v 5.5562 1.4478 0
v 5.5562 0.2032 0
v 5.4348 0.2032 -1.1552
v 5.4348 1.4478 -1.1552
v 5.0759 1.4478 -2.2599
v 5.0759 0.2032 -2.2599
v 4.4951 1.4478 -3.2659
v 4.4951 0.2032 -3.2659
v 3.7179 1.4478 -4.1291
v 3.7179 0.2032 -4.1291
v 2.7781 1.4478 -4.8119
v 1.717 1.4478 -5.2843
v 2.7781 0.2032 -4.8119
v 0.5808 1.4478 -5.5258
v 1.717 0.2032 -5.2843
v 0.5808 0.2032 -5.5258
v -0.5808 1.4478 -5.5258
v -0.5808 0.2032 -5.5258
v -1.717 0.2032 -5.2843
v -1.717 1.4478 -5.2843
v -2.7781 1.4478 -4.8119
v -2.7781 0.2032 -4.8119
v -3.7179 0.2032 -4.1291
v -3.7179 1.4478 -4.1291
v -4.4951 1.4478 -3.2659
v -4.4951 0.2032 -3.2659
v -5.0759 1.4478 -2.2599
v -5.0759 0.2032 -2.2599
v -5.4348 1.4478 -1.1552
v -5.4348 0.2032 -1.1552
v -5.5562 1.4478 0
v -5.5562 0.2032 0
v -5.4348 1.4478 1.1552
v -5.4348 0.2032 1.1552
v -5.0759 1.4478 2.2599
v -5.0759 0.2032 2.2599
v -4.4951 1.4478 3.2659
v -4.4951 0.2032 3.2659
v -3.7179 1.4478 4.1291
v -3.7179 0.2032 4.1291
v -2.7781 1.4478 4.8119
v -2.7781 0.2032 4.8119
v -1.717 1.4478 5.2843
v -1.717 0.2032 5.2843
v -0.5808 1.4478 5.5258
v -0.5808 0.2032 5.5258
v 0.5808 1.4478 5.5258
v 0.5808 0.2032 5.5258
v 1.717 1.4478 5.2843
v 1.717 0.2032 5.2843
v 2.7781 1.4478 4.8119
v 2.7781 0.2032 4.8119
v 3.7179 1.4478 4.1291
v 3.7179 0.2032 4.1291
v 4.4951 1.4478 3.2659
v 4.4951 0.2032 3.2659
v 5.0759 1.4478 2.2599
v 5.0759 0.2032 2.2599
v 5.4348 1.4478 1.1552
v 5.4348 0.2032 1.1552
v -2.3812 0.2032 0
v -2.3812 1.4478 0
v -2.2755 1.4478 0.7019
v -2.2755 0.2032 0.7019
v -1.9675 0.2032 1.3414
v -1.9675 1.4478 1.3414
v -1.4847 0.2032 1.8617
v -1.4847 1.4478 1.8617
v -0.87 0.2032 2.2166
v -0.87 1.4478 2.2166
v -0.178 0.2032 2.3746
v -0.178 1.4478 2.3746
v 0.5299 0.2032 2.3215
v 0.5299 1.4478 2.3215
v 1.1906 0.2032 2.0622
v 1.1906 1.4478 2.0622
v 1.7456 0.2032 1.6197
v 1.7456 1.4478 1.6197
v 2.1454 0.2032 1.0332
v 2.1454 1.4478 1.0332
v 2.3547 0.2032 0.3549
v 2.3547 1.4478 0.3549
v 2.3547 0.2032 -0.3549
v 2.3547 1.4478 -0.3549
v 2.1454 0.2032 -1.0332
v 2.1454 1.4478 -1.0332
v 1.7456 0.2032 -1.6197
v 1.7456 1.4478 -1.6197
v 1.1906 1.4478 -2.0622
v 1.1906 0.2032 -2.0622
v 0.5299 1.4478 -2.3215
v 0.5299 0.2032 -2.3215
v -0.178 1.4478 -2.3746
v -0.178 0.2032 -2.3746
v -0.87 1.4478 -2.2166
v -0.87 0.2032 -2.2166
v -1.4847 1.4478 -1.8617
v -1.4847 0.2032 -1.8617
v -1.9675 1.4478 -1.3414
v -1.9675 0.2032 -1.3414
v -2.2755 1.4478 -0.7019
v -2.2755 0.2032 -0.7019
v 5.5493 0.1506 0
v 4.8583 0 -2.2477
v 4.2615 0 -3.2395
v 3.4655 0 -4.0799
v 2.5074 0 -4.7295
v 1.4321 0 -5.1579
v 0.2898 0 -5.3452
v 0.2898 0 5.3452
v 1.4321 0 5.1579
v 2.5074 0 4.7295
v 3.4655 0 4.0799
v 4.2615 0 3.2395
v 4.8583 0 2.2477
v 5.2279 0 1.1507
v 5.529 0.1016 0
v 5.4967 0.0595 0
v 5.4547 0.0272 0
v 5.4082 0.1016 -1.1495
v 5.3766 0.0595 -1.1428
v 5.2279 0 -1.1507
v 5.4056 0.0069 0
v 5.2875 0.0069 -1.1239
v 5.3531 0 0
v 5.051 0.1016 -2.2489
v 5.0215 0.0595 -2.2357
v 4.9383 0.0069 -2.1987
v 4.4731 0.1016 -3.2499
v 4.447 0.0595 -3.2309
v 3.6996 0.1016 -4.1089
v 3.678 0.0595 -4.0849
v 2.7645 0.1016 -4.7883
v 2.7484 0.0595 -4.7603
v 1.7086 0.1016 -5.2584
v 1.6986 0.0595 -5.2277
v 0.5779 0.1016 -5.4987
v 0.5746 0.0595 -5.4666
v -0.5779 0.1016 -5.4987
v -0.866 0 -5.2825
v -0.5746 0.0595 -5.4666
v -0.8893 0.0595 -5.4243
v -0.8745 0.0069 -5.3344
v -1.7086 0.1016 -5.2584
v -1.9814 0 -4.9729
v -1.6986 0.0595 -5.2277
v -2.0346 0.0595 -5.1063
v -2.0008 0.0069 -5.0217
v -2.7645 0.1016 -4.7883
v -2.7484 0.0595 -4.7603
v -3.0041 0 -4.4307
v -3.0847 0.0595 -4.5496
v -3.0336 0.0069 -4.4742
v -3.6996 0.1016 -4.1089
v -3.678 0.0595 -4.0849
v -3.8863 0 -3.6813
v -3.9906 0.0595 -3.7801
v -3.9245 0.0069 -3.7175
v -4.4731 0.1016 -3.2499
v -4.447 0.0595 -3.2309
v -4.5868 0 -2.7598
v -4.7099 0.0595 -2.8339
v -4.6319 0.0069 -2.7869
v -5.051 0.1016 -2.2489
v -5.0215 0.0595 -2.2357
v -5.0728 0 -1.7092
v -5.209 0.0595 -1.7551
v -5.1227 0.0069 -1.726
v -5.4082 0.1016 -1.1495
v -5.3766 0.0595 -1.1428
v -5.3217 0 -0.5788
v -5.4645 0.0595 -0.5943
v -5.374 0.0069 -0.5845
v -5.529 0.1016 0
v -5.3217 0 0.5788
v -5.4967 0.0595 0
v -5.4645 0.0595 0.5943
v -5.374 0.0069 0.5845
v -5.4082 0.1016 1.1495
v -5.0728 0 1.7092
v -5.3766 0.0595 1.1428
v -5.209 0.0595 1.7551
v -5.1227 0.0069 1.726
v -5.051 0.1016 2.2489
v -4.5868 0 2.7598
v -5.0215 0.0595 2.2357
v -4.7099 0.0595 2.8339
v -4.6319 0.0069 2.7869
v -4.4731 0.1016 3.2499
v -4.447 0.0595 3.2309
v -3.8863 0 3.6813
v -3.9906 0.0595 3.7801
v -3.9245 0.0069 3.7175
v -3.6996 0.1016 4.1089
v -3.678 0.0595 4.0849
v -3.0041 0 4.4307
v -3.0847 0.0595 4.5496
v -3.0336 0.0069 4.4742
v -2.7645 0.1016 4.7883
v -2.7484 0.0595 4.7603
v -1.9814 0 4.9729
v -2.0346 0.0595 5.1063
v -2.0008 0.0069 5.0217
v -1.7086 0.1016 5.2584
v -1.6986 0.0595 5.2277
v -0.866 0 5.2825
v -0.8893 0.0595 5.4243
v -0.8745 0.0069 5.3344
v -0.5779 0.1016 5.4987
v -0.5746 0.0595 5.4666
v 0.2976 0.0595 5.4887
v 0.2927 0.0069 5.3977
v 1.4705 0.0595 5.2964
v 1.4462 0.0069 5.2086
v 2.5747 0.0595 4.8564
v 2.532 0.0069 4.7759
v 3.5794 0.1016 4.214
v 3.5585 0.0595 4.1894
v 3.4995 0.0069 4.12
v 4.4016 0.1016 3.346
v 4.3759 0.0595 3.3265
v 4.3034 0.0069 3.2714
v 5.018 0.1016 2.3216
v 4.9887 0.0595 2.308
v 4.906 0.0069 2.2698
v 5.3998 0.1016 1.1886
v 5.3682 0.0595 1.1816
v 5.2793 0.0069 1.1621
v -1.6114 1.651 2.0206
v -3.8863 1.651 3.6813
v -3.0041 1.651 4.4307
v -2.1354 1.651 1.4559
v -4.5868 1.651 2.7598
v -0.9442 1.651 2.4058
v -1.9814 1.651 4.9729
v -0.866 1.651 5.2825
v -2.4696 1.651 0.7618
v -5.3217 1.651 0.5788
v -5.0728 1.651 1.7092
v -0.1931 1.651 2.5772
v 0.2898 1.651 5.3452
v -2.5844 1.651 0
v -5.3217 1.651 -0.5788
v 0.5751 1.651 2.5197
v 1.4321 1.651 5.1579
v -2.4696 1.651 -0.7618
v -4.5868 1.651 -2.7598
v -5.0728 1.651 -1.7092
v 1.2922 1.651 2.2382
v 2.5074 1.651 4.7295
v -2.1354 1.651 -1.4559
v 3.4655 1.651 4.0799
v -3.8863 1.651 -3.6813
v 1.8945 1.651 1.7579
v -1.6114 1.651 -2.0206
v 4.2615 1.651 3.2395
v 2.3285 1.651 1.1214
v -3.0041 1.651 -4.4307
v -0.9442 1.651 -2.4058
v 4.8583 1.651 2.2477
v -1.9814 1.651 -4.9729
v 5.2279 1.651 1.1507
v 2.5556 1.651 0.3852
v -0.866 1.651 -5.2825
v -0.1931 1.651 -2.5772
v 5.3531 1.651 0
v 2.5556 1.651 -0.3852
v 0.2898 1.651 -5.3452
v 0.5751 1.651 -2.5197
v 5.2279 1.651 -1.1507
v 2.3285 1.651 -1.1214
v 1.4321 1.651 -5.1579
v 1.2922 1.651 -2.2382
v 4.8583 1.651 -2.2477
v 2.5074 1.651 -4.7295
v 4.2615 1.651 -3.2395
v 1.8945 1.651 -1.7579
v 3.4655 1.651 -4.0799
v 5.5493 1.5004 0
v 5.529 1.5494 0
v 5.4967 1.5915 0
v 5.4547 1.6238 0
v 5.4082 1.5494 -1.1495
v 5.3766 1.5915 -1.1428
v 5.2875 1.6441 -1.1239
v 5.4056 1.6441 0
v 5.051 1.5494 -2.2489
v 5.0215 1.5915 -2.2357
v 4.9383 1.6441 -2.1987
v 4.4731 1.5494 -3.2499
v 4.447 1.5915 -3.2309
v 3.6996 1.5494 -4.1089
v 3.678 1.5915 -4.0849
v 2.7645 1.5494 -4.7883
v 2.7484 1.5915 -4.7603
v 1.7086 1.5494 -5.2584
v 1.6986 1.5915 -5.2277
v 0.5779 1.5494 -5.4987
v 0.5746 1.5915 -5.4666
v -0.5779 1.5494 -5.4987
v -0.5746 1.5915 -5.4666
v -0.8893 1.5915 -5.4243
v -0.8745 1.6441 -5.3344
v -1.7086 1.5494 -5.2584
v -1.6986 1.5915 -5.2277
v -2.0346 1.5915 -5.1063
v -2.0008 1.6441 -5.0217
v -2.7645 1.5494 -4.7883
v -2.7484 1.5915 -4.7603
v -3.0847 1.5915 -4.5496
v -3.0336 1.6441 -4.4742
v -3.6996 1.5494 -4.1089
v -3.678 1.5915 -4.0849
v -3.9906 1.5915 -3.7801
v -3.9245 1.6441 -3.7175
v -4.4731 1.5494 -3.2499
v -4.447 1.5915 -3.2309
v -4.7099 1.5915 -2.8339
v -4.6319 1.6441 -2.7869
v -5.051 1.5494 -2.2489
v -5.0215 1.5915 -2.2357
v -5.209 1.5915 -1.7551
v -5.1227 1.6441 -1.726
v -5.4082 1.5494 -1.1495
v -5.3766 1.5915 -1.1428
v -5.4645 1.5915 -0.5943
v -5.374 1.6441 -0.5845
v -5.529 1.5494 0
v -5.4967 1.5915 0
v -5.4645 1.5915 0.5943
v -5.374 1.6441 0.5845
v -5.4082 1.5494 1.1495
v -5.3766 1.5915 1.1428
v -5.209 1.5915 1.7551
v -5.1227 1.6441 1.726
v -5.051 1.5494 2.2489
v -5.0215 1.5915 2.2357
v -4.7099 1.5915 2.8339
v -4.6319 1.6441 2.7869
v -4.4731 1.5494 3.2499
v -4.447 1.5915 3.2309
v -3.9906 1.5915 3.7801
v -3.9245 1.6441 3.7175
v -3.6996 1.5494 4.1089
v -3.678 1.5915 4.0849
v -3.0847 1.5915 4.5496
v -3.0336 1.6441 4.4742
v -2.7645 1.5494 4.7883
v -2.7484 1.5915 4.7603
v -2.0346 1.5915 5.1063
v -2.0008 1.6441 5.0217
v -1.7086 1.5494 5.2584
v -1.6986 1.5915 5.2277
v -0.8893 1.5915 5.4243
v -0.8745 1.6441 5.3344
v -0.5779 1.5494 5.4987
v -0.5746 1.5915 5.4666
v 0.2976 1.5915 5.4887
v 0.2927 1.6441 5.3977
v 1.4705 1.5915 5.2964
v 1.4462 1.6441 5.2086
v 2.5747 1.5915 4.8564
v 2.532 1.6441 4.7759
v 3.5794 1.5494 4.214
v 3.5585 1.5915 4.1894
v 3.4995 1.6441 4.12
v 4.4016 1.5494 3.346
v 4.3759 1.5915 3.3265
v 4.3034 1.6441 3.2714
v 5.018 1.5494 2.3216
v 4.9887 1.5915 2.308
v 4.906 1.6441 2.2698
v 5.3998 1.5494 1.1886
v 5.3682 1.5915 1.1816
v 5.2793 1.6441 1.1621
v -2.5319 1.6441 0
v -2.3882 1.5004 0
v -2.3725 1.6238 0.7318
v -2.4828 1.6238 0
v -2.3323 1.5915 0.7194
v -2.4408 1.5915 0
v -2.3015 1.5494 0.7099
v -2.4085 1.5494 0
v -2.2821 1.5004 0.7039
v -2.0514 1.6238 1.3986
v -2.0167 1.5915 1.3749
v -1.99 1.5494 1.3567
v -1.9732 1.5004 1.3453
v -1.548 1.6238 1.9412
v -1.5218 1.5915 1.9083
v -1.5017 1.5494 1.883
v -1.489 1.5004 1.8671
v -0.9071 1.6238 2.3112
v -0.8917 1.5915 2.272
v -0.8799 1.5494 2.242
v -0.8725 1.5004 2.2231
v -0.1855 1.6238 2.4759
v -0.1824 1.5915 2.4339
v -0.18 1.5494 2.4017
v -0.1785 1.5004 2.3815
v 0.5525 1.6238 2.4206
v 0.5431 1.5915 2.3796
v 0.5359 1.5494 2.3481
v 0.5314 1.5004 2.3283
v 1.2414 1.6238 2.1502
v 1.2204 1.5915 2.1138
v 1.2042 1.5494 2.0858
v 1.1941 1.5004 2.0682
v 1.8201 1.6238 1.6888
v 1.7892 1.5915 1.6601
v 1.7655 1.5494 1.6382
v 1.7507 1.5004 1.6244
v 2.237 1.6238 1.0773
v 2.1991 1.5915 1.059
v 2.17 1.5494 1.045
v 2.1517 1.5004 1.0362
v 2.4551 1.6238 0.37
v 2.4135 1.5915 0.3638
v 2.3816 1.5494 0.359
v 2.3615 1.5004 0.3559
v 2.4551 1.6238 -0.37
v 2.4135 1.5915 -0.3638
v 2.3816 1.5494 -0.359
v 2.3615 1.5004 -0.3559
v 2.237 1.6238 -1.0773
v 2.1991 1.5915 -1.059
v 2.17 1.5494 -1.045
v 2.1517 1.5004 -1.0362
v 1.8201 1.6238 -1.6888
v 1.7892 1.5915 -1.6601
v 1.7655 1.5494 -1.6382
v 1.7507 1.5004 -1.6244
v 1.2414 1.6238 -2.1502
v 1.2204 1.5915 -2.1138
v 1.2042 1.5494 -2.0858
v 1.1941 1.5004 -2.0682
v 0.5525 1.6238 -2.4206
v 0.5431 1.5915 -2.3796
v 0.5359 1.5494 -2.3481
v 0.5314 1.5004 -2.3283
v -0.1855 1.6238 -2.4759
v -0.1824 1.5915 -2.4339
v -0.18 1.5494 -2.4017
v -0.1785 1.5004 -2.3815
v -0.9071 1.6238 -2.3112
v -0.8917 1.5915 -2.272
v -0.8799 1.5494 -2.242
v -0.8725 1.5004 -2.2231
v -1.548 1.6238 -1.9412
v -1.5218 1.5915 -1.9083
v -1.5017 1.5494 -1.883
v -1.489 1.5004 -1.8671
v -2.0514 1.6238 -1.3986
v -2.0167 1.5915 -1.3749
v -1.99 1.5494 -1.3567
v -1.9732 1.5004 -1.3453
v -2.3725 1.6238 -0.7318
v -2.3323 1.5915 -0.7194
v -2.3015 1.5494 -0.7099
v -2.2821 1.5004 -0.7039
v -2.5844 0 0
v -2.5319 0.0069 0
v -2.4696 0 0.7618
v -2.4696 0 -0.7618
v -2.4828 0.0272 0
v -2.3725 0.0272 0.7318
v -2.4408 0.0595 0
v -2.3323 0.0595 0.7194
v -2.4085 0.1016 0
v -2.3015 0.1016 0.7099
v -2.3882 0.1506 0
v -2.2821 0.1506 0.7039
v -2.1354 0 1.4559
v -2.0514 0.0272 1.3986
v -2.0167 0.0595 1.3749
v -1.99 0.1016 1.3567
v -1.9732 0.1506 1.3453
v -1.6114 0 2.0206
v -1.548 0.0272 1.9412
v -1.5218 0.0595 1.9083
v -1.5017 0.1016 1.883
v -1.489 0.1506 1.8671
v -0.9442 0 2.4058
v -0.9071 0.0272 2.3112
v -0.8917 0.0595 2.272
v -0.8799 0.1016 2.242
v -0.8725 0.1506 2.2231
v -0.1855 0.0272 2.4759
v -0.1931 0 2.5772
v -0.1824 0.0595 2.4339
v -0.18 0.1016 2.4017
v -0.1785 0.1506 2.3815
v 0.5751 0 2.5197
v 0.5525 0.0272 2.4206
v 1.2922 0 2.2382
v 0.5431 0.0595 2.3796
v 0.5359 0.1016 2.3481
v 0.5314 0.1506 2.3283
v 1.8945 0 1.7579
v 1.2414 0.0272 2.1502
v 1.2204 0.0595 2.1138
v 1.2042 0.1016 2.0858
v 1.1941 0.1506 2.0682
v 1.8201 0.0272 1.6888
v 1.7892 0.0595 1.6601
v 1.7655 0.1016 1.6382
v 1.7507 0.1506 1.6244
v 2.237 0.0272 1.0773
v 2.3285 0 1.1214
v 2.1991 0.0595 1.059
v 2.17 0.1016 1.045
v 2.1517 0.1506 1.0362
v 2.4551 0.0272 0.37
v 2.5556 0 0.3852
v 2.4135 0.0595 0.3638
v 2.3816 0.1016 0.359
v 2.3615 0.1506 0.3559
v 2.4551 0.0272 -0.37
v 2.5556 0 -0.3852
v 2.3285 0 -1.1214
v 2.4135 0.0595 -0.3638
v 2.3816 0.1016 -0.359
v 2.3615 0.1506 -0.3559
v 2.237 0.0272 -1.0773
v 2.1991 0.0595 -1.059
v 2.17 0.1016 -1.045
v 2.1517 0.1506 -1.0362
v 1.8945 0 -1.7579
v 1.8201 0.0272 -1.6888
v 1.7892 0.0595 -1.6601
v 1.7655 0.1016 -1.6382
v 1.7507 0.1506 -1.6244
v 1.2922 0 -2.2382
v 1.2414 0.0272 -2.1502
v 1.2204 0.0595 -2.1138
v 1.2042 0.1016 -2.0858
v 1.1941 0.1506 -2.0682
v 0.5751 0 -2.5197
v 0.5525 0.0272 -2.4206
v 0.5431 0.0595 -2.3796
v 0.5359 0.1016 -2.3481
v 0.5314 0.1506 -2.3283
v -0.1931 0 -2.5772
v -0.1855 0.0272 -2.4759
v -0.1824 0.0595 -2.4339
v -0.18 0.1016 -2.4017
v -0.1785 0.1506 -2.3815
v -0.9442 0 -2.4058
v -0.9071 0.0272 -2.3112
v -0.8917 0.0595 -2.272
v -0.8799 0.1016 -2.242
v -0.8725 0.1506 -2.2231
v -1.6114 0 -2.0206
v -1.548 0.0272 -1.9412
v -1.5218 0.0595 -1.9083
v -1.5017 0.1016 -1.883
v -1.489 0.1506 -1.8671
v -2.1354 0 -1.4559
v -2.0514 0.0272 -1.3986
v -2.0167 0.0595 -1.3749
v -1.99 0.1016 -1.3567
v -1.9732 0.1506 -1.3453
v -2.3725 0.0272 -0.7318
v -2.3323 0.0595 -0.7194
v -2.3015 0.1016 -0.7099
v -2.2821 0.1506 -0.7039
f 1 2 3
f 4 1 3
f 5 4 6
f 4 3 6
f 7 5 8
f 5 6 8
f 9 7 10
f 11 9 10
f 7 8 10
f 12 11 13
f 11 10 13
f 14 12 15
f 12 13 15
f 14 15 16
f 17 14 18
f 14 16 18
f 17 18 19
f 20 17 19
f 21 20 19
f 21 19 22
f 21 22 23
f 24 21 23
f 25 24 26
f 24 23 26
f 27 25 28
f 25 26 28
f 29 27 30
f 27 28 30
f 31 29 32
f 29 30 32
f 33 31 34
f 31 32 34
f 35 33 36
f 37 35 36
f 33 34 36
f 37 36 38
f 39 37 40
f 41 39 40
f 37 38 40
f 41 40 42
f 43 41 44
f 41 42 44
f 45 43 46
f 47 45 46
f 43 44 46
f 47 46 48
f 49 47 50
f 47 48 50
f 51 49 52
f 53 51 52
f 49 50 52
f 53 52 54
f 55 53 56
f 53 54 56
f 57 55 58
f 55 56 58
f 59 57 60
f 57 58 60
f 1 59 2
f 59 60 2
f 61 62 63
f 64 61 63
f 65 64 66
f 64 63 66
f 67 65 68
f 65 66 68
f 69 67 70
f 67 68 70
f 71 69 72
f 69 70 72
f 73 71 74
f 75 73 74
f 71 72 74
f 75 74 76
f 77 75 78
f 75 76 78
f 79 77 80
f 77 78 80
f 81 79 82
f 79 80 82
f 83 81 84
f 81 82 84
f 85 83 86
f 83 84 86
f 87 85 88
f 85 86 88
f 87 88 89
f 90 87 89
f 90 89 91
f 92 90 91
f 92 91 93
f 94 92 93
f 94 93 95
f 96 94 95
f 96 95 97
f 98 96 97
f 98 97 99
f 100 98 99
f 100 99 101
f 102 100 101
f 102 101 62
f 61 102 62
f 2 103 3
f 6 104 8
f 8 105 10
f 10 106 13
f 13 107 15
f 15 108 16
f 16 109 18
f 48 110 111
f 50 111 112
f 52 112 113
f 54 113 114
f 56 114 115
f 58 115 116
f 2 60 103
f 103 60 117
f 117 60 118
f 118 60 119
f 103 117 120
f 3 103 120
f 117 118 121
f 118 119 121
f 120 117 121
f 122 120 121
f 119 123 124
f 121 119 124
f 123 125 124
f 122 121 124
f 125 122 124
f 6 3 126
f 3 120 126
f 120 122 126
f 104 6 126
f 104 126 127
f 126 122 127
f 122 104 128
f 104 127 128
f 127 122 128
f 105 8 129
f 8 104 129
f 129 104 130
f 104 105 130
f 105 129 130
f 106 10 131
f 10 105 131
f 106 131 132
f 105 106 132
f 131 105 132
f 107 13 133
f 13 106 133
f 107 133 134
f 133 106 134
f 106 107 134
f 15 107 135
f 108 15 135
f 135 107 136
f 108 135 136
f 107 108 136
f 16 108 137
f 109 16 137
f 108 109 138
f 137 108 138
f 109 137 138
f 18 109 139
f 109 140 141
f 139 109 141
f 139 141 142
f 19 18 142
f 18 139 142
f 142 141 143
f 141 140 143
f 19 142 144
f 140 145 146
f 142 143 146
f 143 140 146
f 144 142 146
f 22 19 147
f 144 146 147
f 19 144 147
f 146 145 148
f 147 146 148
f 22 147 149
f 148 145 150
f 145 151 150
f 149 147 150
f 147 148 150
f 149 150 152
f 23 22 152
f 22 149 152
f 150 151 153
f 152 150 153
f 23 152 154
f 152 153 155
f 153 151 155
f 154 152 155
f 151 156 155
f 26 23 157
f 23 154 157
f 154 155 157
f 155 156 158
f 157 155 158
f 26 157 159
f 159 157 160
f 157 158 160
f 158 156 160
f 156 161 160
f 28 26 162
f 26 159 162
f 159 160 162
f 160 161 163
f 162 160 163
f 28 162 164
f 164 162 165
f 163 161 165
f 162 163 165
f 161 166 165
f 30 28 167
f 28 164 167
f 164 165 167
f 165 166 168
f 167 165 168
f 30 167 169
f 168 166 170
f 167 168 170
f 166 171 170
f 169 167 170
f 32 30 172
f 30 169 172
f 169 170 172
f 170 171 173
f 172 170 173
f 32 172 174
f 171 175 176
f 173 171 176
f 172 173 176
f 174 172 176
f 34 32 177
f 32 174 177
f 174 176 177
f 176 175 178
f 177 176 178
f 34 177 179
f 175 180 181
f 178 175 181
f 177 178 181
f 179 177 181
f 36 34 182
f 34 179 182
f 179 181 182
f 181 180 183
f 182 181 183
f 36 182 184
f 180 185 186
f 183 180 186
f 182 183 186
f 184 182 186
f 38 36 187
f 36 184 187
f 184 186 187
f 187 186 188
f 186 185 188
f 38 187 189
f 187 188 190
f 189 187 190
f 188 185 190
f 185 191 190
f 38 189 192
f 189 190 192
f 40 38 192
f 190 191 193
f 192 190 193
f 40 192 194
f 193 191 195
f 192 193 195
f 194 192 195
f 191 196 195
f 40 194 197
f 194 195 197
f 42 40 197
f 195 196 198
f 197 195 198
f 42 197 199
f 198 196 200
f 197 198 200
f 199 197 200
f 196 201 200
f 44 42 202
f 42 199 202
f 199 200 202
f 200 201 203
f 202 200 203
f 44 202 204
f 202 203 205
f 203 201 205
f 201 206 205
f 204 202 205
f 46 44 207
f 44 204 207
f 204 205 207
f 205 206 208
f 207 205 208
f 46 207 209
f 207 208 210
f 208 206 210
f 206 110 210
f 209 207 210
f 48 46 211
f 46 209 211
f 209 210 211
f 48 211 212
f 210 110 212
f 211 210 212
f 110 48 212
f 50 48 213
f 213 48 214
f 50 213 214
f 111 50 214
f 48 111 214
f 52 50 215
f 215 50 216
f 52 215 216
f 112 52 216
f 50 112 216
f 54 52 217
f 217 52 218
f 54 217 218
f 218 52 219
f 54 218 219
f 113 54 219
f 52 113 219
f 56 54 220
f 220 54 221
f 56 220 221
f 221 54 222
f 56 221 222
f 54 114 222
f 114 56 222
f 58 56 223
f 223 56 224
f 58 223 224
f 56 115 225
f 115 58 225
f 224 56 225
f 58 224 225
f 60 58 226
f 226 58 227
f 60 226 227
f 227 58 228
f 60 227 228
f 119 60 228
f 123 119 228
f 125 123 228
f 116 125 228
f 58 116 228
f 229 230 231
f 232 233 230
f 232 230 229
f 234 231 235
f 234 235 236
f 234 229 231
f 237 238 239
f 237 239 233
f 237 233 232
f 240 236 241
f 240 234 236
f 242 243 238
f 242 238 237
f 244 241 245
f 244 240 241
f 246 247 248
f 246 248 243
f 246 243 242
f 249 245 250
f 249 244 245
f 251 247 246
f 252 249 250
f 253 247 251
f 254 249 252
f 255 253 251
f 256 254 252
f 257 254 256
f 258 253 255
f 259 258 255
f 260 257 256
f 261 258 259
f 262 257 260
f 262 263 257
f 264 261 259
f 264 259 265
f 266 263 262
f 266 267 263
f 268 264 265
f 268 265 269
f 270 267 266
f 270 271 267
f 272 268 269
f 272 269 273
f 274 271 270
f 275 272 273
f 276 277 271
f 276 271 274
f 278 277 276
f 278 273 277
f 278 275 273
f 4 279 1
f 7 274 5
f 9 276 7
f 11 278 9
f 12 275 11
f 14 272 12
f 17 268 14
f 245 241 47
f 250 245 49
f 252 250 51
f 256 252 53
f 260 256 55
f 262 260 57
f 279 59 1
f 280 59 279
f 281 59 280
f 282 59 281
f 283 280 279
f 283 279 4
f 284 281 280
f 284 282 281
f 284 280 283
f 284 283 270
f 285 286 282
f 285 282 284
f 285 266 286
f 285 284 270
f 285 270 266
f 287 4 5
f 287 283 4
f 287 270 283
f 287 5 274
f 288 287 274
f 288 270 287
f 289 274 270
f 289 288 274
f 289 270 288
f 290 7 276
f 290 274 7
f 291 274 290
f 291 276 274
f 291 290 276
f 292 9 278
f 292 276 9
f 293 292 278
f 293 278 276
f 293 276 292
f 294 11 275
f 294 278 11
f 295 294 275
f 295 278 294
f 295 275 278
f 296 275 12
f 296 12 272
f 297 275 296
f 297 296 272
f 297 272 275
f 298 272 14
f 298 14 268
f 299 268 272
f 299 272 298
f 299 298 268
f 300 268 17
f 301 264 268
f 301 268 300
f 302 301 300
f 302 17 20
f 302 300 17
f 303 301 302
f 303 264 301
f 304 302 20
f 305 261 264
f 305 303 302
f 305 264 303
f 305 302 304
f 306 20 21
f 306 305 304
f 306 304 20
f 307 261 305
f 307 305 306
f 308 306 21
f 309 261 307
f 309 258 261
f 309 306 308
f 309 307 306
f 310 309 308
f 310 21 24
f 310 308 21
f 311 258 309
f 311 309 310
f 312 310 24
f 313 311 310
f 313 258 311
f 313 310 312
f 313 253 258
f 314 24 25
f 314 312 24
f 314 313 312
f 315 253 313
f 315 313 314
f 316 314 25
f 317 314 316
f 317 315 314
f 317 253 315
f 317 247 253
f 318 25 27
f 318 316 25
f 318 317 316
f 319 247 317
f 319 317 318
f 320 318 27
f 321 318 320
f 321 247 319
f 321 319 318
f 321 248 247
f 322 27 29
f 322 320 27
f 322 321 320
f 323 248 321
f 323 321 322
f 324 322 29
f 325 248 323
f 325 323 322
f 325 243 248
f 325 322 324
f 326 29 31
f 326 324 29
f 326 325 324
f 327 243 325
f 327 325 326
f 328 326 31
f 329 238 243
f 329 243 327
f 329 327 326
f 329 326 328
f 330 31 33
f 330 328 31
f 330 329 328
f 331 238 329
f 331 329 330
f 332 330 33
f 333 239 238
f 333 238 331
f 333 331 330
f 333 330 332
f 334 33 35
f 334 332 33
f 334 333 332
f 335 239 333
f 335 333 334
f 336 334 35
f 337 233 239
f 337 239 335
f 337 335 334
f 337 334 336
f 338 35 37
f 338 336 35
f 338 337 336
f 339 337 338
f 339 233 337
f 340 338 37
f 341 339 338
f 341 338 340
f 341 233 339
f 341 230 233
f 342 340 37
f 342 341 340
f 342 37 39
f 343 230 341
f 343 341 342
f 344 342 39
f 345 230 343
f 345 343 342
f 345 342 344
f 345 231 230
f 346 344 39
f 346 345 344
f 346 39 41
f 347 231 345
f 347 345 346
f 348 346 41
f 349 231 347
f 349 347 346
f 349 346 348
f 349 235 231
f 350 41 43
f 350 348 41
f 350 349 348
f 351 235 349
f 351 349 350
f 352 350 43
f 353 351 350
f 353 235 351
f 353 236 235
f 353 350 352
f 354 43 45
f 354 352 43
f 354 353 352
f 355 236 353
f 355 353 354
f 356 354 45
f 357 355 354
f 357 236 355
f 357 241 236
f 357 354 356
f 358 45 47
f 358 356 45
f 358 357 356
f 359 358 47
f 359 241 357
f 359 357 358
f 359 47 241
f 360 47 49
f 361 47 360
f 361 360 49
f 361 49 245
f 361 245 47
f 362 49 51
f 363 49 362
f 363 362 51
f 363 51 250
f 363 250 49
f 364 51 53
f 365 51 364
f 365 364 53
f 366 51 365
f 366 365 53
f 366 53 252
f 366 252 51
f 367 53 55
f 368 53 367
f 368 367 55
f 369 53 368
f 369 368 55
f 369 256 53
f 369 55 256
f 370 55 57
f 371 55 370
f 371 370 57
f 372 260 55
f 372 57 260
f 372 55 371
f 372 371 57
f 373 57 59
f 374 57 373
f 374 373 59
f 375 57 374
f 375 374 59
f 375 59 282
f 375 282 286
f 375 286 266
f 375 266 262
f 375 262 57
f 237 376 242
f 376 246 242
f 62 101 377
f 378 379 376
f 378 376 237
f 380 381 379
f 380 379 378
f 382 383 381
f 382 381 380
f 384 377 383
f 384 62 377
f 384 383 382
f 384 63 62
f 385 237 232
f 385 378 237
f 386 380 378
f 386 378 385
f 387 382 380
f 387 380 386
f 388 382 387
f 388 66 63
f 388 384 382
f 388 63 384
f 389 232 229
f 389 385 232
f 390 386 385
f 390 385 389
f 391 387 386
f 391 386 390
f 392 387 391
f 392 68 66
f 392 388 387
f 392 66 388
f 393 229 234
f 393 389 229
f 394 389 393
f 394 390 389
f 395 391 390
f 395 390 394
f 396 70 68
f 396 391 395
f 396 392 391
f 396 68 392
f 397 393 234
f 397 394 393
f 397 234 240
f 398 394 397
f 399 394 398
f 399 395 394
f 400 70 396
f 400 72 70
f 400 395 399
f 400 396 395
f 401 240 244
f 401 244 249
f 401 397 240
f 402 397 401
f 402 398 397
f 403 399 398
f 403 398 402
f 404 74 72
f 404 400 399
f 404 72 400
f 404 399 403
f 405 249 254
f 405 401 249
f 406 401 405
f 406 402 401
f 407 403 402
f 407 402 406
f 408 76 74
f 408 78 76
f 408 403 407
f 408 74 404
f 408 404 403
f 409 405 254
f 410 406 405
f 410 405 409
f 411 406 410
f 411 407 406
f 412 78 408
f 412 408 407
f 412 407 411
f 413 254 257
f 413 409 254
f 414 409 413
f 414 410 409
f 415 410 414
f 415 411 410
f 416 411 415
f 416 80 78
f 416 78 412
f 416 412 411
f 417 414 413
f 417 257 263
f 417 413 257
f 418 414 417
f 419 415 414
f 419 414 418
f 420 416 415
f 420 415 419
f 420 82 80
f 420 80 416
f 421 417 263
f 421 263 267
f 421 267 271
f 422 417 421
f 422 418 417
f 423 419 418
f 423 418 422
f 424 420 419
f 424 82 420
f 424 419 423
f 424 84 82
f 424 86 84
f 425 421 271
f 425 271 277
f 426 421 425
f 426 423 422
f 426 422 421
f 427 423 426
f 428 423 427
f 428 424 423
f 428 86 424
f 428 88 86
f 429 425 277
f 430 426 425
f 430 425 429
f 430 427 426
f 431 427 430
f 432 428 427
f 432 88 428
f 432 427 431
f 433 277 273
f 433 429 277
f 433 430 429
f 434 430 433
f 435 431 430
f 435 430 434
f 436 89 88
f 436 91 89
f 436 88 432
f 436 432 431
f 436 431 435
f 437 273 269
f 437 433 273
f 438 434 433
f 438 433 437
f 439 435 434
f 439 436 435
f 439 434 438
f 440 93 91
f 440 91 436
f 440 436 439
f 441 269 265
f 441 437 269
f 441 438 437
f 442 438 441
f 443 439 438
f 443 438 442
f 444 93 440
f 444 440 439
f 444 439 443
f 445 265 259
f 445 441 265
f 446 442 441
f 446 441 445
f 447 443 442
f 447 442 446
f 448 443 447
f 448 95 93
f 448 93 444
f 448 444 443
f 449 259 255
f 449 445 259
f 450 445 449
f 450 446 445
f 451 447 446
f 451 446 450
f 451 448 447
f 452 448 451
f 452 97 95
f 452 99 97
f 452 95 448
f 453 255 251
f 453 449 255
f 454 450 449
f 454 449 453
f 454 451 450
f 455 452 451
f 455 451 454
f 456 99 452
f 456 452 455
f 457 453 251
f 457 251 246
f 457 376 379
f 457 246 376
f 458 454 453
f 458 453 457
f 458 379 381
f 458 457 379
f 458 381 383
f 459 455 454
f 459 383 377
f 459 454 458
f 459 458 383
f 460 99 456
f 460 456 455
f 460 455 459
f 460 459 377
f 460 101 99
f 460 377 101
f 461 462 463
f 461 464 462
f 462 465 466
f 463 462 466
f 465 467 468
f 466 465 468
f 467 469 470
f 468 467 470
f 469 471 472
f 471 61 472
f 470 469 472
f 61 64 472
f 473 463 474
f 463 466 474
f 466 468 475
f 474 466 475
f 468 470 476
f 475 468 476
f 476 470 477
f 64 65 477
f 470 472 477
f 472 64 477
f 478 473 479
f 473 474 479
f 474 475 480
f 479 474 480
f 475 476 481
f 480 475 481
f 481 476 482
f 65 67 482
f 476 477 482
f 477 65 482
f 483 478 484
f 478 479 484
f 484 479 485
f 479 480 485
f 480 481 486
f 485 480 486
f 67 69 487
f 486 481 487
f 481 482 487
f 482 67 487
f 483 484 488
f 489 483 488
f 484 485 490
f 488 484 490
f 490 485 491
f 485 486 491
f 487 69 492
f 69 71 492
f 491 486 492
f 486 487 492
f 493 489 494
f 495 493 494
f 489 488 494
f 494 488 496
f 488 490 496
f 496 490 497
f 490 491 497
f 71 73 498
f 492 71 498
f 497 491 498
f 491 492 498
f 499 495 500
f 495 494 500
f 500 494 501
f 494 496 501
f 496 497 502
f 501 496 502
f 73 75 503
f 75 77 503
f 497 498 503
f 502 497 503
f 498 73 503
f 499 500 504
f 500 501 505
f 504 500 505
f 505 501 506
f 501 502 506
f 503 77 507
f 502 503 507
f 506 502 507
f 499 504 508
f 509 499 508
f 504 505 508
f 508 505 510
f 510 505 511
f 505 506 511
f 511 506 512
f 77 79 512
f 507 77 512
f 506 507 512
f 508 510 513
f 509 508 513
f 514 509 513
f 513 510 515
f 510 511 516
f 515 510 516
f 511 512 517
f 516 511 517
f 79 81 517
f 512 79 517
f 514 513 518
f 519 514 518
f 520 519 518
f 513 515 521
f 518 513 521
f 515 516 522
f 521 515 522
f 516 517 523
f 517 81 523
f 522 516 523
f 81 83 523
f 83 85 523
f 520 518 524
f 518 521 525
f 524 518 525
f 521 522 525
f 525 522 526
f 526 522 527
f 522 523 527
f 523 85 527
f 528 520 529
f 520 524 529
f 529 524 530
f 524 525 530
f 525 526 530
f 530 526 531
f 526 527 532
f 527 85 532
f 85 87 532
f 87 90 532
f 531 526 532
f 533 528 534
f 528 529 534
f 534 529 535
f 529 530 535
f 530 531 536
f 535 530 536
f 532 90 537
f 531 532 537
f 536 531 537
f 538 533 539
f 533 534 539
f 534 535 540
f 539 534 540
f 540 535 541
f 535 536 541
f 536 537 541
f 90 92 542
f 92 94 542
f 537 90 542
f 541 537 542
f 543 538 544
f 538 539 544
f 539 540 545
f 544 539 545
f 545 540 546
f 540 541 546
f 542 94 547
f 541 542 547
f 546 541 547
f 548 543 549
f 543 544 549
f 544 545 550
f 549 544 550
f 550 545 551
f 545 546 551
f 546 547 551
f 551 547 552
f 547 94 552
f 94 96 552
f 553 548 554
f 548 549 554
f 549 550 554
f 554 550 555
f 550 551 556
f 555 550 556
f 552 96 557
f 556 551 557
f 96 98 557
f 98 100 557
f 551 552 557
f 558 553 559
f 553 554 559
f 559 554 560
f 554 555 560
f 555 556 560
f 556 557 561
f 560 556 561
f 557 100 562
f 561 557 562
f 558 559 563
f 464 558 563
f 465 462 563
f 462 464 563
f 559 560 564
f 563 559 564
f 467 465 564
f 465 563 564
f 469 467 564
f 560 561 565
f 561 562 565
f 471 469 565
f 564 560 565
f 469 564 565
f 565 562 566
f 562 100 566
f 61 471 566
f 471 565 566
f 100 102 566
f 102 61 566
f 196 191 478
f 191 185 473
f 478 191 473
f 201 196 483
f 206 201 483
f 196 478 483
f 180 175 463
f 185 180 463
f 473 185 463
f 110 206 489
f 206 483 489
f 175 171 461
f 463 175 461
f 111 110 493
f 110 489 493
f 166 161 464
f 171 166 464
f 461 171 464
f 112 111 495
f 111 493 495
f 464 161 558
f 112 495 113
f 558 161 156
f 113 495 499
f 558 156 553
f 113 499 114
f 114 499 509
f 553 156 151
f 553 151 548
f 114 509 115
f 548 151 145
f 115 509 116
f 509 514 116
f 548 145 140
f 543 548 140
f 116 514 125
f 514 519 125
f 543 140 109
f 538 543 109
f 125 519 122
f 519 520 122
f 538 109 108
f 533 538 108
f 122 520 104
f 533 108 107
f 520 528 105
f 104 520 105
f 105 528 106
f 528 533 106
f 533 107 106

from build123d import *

# Parameters (mm, degrees)
SKETCH1_R           = 5.55625
BOSS_EXTRUDE1_DEPTH = 1.651
SKETCH5_R           = 2.38125
CUT_EXTRUDE1_DEPTH  = 2.651
FILLET1_R           = 0.2032


with BuildPart() as part:
    # Sketch1 → Boss-Extrude1 (new body)
    with BuildSketch(Plane(origin=(0, 0, 0), x_dir=(1, 0, 0), z_dir=(0, 1, 0))):
        Circle(SKETCH1_R)
    extrude(amount=BOSS_EXTRUDE1_DEPTH)

    # Sketch5 → Cut-Extrude1 (cut, through all)
    with BuildSketch(Plane(origin=(0, 1.651, 0), x_dir=(-1, 0, 0), z_dir=(0, 1, 0))):
        Circle(SKETCH5_R)
    extrude(amount=-CUT_EXTRUDE1_DEPTH, mode=Mode.SUBTRACT)

    # Fillet1
    fillet1_edges = [part.edges().sort_by_distance(p)[0] for p in [
        (-5.55625, 0, 0),
        (-5.55625, 1.651, 0),
        (2.38125, 0, 0),
        (2.38125, 1.651, 0),
    ]]
    fillet(fillet1_edges, radius=FILLET1_R)


solid = part.part
